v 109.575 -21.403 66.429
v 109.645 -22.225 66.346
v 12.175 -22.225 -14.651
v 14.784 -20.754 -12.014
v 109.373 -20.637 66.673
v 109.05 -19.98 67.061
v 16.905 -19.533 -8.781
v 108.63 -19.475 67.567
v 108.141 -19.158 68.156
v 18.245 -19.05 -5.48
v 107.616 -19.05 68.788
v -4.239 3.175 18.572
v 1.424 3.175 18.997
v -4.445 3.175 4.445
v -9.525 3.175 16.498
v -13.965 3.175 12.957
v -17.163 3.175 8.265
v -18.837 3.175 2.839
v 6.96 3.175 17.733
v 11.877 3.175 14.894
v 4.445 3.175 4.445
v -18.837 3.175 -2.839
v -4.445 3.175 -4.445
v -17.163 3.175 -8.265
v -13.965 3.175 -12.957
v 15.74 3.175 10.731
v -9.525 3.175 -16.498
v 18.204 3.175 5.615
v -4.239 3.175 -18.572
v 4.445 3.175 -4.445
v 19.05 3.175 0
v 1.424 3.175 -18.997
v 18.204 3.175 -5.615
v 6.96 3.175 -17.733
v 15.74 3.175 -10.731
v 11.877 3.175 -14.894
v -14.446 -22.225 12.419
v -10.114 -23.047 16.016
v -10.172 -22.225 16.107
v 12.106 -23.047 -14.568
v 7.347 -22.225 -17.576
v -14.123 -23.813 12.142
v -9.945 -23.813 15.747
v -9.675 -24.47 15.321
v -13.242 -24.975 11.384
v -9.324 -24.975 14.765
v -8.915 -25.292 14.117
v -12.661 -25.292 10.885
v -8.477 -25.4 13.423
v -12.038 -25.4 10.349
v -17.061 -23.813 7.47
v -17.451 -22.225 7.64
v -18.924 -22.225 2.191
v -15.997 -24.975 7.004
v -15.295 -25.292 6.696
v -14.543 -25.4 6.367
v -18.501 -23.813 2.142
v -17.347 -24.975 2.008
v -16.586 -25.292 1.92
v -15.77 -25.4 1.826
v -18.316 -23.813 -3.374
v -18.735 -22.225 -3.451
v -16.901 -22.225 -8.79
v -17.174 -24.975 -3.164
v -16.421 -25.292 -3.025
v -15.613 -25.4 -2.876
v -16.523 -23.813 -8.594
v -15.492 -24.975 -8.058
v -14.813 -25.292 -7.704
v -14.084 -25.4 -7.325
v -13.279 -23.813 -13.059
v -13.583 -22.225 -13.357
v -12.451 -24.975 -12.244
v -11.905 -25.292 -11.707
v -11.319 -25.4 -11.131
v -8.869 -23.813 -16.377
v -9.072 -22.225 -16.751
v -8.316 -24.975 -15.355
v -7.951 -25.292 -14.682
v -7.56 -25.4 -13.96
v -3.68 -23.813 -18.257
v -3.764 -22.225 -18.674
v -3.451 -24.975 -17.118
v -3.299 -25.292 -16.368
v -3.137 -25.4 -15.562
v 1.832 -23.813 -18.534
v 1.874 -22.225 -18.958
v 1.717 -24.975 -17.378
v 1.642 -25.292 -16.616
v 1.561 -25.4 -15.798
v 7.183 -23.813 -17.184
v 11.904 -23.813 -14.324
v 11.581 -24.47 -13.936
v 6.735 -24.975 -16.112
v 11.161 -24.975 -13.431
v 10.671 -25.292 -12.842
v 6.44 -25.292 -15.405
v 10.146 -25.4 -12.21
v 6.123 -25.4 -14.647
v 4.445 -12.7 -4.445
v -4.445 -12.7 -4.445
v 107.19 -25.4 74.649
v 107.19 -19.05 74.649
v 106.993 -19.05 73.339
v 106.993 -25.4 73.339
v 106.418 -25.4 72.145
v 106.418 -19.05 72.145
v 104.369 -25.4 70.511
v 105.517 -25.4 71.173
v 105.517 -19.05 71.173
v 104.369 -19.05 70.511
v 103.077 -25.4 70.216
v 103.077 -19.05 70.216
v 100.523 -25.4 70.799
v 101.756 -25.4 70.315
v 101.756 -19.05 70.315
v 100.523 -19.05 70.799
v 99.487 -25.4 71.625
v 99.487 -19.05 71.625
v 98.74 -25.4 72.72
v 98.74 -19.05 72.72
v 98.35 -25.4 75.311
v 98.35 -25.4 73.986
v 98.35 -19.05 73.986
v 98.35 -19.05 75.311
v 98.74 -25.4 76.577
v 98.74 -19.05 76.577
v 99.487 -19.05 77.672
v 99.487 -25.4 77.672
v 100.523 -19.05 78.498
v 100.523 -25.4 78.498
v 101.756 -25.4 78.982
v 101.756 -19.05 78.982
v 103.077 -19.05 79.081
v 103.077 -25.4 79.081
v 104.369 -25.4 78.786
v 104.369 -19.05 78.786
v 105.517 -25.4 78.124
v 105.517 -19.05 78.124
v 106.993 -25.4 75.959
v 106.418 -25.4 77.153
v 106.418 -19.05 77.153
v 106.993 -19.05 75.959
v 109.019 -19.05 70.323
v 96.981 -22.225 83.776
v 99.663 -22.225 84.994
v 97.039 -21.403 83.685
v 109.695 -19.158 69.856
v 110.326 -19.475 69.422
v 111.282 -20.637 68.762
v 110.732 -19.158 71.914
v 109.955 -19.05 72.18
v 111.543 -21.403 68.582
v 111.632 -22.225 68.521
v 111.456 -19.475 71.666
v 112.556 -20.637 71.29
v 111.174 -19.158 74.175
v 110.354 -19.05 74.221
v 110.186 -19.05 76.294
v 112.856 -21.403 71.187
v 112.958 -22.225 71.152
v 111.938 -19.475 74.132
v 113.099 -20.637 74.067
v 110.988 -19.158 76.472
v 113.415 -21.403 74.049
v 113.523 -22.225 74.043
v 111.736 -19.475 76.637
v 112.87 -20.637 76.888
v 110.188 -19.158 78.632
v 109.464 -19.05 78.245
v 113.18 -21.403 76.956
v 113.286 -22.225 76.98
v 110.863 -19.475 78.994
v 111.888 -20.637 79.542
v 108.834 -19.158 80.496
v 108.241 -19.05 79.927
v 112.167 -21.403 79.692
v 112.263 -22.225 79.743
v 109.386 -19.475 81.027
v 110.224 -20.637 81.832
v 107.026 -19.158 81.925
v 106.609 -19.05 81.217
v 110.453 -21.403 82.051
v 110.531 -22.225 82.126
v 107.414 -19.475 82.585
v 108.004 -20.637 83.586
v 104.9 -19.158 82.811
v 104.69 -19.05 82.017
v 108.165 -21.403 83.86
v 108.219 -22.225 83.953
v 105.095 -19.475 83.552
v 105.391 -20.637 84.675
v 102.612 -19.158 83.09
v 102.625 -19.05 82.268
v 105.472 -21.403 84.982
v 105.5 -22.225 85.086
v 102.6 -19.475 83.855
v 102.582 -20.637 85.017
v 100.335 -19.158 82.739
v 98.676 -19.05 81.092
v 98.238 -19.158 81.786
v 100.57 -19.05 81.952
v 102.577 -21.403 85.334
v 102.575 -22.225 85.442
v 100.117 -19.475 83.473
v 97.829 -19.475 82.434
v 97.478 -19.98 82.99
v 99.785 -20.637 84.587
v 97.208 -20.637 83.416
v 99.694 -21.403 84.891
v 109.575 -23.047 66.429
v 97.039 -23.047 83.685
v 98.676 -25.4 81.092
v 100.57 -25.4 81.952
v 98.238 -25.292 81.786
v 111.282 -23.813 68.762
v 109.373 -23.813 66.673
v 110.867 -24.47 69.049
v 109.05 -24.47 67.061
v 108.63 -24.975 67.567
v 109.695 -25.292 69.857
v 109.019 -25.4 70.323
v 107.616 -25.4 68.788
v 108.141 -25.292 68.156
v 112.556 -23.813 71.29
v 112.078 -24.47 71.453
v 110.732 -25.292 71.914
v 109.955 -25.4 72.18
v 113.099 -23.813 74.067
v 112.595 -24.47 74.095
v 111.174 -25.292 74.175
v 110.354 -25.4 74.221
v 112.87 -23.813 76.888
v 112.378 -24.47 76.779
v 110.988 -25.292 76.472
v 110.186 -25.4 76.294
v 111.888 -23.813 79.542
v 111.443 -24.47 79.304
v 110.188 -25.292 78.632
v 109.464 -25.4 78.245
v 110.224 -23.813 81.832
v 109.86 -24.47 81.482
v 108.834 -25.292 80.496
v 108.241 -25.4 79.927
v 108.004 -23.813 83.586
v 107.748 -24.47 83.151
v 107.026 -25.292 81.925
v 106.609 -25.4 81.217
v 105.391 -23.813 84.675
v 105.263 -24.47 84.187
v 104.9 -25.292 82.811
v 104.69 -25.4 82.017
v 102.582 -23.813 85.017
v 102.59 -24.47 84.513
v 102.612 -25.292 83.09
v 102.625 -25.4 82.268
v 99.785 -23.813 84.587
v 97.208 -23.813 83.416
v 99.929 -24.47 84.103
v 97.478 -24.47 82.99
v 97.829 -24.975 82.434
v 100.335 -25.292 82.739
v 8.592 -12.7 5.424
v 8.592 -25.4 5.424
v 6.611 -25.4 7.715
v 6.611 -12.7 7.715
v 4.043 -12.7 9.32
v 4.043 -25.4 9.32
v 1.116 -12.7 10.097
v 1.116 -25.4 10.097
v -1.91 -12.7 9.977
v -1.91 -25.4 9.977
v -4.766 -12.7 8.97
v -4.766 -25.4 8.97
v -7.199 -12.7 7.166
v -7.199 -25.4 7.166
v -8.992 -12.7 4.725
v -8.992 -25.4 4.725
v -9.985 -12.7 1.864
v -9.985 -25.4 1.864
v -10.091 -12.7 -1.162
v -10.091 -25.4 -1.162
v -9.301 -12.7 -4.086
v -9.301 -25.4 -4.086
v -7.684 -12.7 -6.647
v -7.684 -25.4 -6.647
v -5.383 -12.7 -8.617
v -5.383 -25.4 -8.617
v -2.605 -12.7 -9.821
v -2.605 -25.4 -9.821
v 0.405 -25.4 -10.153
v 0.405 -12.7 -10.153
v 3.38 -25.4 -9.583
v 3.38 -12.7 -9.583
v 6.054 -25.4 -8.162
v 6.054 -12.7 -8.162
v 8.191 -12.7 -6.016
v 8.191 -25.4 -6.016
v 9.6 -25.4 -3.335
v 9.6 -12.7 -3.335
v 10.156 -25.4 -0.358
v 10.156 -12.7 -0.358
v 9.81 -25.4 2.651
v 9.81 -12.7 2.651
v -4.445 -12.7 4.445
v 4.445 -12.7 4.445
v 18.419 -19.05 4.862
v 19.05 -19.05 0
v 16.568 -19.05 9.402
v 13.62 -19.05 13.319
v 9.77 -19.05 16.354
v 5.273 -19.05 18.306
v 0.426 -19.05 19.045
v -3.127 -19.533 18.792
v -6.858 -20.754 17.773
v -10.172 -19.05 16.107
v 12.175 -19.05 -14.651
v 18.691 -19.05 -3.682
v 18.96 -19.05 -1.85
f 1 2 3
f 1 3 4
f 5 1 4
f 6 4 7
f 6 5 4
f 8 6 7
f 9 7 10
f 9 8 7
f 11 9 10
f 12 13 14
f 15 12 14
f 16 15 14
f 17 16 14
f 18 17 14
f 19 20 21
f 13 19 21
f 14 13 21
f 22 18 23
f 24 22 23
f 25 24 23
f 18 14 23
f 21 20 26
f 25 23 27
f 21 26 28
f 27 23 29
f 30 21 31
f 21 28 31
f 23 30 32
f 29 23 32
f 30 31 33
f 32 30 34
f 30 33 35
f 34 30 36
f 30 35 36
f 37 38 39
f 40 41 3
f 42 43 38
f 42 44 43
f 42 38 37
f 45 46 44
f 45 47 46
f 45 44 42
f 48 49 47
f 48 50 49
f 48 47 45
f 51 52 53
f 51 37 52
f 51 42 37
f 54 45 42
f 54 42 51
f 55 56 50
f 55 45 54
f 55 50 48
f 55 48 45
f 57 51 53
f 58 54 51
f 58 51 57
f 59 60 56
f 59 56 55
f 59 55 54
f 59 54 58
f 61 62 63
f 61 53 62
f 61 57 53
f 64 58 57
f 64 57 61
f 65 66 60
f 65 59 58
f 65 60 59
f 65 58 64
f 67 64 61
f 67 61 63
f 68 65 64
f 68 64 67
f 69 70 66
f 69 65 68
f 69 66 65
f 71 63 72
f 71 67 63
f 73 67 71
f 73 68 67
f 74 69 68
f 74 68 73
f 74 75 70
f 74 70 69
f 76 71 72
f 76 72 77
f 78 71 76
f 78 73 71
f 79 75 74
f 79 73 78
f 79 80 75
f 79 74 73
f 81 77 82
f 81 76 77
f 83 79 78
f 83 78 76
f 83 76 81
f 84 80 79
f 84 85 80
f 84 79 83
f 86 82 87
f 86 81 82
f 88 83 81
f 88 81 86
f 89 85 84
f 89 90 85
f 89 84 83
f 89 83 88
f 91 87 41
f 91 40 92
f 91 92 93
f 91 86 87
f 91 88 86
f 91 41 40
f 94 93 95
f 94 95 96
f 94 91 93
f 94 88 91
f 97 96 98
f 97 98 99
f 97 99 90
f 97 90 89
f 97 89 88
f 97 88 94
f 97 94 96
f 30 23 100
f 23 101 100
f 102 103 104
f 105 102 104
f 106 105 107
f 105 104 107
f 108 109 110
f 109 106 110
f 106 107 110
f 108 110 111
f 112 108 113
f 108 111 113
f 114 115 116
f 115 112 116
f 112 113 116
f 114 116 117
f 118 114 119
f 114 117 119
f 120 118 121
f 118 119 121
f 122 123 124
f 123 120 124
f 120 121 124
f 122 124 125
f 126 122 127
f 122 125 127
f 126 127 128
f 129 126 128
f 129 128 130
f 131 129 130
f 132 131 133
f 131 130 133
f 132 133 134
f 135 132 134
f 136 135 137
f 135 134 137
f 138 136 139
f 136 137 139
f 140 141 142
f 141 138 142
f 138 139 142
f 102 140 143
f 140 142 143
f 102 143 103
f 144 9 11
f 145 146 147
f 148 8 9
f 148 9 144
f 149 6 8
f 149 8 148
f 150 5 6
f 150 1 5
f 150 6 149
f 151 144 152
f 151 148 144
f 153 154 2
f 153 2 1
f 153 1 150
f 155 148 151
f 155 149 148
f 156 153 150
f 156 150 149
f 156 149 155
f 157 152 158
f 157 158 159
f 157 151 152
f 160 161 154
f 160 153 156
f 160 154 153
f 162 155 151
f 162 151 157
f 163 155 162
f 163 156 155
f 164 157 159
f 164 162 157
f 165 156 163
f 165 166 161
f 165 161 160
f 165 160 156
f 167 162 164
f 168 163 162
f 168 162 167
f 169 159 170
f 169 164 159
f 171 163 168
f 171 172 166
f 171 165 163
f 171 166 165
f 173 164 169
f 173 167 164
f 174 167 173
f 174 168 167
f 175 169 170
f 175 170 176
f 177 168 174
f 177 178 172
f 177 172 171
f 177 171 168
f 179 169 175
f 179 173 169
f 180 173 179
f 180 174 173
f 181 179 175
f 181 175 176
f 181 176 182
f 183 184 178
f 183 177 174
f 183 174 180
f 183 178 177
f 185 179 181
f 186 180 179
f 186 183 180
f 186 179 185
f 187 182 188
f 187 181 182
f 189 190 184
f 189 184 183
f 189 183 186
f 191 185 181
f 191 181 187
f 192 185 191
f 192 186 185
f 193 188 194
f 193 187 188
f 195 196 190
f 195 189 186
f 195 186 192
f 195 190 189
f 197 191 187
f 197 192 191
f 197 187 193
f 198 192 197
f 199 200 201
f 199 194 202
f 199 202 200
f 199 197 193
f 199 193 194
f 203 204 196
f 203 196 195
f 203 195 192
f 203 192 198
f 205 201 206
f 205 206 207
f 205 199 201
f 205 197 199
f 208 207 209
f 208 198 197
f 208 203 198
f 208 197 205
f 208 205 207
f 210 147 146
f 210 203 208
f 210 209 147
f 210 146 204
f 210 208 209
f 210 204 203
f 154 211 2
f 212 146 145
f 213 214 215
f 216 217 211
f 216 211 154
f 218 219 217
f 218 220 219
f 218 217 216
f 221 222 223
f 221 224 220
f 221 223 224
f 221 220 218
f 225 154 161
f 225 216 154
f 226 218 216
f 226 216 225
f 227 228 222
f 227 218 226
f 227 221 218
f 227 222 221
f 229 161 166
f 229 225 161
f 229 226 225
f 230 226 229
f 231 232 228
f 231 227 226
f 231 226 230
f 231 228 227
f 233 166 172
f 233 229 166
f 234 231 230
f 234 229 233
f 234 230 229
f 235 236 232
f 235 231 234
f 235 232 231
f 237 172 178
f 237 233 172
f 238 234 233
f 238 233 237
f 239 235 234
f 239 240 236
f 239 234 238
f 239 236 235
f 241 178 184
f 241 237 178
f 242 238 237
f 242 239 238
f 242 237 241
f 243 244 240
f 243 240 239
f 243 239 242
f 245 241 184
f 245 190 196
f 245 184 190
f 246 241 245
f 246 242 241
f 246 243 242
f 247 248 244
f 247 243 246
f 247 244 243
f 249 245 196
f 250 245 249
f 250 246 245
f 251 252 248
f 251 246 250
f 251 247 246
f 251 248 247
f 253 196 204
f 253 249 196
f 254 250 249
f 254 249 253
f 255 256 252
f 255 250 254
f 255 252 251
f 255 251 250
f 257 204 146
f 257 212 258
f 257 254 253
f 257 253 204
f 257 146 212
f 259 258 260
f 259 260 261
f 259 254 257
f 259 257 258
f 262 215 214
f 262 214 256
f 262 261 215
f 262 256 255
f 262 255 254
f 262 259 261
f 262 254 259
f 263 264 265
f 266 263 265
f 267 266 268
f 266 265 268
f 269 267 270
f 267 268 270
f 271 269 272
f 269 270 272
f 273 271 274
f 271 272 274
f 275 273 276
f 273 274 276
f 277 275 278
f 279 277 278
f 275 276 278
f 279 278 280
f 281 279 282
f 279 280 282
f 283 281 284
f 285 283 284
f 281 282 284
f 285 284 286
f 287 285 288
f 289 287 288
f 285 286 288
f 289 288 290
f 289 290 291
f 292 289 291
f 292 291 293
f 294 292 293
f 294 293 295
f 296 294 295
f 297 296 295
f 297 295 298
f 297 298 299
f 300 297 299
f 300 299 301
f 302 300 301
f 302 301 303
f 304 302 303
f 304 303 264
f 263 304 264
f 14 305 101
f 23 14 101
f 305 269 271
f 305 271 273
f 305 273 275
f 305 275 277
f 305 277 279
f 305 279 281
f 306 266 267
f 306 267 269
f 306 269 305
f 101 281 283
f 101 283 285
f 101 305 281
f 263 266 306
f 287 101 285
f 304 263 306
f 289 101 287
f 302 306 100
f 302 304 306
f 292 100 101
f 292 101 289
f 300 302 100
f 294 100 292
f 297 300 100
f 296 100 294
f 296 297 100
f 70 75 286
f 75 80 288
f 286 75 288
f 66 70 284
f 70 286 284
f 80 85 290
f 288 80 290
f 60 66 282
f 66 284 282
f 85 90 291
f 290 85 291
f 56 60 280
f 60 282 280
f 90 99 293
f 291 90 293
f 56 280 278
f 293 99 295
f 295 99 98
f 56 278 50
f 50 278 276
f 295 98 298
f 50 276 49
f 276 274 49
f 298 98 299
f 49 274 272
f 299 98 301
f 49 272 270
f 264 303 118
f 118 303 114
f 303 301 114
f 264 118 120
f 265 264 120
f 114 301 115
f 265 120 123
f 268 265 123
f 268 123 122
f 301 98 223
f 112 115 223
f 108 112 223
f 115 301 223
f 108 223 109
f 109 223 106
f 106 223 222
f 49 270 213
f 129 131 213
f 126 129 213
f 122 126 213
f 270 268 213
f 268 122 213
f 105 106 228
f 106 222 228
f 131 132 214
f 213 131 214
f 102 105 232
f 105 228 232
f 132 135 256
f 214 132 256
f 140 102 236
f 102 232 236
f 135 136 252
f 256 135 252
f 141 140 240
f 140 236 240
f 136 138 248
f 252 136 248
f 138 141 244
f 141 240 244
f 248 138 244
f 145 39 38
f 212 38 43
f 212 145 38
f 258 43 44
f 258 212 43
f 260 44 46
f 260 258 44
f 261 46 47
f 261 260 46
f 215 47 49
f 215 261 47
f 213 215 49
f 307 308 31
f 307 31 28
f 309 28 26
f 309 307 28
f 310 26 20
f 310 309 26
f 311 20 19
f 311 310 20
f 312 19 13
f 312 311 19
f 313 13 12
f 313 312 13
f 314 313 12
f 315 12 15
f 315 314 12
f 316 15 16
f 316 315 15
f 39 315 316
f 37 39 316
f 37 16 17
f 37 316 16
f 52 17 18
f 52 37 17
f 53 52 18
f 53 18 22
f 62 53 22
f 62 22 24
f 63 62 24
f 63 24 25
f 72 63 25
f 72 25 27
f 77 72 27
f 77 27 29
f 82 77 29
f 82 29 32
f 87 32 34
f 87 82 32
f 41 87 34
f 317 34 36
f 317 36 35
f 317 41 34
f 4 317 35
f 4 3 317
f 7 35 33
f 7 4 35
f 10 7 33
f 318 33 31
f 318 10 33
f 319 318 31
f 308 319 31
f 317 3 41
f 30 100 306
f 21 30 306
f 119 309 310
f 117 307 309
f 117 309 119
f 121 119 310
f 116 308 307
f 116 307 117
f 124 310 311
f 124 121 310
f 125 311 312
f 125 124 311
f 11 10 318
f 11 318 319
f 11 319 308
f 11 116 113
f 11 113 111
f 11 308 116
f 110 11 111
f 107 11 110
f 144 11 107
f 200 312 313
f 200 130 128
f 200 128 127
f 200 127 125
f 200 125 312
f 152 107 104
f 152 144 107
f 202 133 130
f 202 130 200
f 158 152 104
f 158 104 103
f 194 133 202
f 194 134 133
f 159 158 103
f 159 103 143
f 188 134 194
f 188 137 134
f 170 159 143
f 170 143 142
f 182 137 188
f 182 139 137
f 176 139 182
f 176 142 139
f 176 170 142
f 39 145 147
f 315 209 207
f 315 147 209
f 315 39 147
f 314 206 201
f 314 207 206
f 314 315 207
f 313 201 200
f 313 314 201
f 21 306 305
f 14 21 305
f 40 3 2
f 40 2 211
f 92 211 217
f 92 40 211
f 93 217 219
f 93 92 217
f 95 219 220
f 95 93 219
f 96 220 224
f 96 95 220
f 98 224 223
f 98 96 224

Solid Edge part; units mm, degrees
sketch "Sketch1" plane through (0, 0, 0) normal (0, -1, 0) x (1, 0, 0)
  circle A0 centre (0, 0) radius 19.05
extrude "Hub" add sketch "Sketch1" against normal blind 3.175 and the other way blind 19.05
sketch "Sketch2" plane through (0, -19.05, 0) normal (0, -1, 0) x (1, 0, 0)
  line L0 (-10.1719, 16.107) -> (96.9811, 83.776)
  arc A0 (109.6445, 66.3463) -> (96.9811, 83.776) centre (102.7452, 74.6487) ccw
  line L1 (12.1754, -14.6514) -> (109.6445, 66.3463)
  arc A1 (-10.1719, 16.107) -> (12.1754, -14.6514) centre (0, 0) ccw
  circle A2 centre (102.7452, 74.6487) radius 4.445
  dimension "D1" = 127
  dimension "D2" = 10.795
extrude "Crank_Arm" add sketch "Sketch2" along normal blind 6.35
fillet "Round_8" radius 3.175 4 edges at (43.4046, -25.4, 49.9415) (-15.4118, -25.4, -11.1973) (111.4785, -25.4, 80.9939) (111.4785, -19.05, 80.9939)
sketch "Sketch3" plane through (33.1969, -25.4, 47.2451) normal (0, -1, 0) x (0.8455, 0, 0.534)
  circle A0 centre (-53.2952, -22.2206) radius 10.16
extrude "ExtrudedCutout_1" cut sketch "Sketch3" against normal blind 12.7
sketch "Sketch4" plane through (0, -12.7, 0) normal (0, -1, 0) x (0, 0, 1)
  line L0 (-4.445, -4.445) -> (4.445, -4.445)
  line L1 (4.445, -4.445) -> (4.445, 4.445)
  line L2 (4.445, 4.445) -> (-4.445, 4.445)
  line L3 (-4.445, 4.445) -> (-4.445, -4.445)
extrude "Cutout1" cut sketch "Sketch4" against normal through all
properties part number "8-12" material "Aluminum, 7075-T6"
